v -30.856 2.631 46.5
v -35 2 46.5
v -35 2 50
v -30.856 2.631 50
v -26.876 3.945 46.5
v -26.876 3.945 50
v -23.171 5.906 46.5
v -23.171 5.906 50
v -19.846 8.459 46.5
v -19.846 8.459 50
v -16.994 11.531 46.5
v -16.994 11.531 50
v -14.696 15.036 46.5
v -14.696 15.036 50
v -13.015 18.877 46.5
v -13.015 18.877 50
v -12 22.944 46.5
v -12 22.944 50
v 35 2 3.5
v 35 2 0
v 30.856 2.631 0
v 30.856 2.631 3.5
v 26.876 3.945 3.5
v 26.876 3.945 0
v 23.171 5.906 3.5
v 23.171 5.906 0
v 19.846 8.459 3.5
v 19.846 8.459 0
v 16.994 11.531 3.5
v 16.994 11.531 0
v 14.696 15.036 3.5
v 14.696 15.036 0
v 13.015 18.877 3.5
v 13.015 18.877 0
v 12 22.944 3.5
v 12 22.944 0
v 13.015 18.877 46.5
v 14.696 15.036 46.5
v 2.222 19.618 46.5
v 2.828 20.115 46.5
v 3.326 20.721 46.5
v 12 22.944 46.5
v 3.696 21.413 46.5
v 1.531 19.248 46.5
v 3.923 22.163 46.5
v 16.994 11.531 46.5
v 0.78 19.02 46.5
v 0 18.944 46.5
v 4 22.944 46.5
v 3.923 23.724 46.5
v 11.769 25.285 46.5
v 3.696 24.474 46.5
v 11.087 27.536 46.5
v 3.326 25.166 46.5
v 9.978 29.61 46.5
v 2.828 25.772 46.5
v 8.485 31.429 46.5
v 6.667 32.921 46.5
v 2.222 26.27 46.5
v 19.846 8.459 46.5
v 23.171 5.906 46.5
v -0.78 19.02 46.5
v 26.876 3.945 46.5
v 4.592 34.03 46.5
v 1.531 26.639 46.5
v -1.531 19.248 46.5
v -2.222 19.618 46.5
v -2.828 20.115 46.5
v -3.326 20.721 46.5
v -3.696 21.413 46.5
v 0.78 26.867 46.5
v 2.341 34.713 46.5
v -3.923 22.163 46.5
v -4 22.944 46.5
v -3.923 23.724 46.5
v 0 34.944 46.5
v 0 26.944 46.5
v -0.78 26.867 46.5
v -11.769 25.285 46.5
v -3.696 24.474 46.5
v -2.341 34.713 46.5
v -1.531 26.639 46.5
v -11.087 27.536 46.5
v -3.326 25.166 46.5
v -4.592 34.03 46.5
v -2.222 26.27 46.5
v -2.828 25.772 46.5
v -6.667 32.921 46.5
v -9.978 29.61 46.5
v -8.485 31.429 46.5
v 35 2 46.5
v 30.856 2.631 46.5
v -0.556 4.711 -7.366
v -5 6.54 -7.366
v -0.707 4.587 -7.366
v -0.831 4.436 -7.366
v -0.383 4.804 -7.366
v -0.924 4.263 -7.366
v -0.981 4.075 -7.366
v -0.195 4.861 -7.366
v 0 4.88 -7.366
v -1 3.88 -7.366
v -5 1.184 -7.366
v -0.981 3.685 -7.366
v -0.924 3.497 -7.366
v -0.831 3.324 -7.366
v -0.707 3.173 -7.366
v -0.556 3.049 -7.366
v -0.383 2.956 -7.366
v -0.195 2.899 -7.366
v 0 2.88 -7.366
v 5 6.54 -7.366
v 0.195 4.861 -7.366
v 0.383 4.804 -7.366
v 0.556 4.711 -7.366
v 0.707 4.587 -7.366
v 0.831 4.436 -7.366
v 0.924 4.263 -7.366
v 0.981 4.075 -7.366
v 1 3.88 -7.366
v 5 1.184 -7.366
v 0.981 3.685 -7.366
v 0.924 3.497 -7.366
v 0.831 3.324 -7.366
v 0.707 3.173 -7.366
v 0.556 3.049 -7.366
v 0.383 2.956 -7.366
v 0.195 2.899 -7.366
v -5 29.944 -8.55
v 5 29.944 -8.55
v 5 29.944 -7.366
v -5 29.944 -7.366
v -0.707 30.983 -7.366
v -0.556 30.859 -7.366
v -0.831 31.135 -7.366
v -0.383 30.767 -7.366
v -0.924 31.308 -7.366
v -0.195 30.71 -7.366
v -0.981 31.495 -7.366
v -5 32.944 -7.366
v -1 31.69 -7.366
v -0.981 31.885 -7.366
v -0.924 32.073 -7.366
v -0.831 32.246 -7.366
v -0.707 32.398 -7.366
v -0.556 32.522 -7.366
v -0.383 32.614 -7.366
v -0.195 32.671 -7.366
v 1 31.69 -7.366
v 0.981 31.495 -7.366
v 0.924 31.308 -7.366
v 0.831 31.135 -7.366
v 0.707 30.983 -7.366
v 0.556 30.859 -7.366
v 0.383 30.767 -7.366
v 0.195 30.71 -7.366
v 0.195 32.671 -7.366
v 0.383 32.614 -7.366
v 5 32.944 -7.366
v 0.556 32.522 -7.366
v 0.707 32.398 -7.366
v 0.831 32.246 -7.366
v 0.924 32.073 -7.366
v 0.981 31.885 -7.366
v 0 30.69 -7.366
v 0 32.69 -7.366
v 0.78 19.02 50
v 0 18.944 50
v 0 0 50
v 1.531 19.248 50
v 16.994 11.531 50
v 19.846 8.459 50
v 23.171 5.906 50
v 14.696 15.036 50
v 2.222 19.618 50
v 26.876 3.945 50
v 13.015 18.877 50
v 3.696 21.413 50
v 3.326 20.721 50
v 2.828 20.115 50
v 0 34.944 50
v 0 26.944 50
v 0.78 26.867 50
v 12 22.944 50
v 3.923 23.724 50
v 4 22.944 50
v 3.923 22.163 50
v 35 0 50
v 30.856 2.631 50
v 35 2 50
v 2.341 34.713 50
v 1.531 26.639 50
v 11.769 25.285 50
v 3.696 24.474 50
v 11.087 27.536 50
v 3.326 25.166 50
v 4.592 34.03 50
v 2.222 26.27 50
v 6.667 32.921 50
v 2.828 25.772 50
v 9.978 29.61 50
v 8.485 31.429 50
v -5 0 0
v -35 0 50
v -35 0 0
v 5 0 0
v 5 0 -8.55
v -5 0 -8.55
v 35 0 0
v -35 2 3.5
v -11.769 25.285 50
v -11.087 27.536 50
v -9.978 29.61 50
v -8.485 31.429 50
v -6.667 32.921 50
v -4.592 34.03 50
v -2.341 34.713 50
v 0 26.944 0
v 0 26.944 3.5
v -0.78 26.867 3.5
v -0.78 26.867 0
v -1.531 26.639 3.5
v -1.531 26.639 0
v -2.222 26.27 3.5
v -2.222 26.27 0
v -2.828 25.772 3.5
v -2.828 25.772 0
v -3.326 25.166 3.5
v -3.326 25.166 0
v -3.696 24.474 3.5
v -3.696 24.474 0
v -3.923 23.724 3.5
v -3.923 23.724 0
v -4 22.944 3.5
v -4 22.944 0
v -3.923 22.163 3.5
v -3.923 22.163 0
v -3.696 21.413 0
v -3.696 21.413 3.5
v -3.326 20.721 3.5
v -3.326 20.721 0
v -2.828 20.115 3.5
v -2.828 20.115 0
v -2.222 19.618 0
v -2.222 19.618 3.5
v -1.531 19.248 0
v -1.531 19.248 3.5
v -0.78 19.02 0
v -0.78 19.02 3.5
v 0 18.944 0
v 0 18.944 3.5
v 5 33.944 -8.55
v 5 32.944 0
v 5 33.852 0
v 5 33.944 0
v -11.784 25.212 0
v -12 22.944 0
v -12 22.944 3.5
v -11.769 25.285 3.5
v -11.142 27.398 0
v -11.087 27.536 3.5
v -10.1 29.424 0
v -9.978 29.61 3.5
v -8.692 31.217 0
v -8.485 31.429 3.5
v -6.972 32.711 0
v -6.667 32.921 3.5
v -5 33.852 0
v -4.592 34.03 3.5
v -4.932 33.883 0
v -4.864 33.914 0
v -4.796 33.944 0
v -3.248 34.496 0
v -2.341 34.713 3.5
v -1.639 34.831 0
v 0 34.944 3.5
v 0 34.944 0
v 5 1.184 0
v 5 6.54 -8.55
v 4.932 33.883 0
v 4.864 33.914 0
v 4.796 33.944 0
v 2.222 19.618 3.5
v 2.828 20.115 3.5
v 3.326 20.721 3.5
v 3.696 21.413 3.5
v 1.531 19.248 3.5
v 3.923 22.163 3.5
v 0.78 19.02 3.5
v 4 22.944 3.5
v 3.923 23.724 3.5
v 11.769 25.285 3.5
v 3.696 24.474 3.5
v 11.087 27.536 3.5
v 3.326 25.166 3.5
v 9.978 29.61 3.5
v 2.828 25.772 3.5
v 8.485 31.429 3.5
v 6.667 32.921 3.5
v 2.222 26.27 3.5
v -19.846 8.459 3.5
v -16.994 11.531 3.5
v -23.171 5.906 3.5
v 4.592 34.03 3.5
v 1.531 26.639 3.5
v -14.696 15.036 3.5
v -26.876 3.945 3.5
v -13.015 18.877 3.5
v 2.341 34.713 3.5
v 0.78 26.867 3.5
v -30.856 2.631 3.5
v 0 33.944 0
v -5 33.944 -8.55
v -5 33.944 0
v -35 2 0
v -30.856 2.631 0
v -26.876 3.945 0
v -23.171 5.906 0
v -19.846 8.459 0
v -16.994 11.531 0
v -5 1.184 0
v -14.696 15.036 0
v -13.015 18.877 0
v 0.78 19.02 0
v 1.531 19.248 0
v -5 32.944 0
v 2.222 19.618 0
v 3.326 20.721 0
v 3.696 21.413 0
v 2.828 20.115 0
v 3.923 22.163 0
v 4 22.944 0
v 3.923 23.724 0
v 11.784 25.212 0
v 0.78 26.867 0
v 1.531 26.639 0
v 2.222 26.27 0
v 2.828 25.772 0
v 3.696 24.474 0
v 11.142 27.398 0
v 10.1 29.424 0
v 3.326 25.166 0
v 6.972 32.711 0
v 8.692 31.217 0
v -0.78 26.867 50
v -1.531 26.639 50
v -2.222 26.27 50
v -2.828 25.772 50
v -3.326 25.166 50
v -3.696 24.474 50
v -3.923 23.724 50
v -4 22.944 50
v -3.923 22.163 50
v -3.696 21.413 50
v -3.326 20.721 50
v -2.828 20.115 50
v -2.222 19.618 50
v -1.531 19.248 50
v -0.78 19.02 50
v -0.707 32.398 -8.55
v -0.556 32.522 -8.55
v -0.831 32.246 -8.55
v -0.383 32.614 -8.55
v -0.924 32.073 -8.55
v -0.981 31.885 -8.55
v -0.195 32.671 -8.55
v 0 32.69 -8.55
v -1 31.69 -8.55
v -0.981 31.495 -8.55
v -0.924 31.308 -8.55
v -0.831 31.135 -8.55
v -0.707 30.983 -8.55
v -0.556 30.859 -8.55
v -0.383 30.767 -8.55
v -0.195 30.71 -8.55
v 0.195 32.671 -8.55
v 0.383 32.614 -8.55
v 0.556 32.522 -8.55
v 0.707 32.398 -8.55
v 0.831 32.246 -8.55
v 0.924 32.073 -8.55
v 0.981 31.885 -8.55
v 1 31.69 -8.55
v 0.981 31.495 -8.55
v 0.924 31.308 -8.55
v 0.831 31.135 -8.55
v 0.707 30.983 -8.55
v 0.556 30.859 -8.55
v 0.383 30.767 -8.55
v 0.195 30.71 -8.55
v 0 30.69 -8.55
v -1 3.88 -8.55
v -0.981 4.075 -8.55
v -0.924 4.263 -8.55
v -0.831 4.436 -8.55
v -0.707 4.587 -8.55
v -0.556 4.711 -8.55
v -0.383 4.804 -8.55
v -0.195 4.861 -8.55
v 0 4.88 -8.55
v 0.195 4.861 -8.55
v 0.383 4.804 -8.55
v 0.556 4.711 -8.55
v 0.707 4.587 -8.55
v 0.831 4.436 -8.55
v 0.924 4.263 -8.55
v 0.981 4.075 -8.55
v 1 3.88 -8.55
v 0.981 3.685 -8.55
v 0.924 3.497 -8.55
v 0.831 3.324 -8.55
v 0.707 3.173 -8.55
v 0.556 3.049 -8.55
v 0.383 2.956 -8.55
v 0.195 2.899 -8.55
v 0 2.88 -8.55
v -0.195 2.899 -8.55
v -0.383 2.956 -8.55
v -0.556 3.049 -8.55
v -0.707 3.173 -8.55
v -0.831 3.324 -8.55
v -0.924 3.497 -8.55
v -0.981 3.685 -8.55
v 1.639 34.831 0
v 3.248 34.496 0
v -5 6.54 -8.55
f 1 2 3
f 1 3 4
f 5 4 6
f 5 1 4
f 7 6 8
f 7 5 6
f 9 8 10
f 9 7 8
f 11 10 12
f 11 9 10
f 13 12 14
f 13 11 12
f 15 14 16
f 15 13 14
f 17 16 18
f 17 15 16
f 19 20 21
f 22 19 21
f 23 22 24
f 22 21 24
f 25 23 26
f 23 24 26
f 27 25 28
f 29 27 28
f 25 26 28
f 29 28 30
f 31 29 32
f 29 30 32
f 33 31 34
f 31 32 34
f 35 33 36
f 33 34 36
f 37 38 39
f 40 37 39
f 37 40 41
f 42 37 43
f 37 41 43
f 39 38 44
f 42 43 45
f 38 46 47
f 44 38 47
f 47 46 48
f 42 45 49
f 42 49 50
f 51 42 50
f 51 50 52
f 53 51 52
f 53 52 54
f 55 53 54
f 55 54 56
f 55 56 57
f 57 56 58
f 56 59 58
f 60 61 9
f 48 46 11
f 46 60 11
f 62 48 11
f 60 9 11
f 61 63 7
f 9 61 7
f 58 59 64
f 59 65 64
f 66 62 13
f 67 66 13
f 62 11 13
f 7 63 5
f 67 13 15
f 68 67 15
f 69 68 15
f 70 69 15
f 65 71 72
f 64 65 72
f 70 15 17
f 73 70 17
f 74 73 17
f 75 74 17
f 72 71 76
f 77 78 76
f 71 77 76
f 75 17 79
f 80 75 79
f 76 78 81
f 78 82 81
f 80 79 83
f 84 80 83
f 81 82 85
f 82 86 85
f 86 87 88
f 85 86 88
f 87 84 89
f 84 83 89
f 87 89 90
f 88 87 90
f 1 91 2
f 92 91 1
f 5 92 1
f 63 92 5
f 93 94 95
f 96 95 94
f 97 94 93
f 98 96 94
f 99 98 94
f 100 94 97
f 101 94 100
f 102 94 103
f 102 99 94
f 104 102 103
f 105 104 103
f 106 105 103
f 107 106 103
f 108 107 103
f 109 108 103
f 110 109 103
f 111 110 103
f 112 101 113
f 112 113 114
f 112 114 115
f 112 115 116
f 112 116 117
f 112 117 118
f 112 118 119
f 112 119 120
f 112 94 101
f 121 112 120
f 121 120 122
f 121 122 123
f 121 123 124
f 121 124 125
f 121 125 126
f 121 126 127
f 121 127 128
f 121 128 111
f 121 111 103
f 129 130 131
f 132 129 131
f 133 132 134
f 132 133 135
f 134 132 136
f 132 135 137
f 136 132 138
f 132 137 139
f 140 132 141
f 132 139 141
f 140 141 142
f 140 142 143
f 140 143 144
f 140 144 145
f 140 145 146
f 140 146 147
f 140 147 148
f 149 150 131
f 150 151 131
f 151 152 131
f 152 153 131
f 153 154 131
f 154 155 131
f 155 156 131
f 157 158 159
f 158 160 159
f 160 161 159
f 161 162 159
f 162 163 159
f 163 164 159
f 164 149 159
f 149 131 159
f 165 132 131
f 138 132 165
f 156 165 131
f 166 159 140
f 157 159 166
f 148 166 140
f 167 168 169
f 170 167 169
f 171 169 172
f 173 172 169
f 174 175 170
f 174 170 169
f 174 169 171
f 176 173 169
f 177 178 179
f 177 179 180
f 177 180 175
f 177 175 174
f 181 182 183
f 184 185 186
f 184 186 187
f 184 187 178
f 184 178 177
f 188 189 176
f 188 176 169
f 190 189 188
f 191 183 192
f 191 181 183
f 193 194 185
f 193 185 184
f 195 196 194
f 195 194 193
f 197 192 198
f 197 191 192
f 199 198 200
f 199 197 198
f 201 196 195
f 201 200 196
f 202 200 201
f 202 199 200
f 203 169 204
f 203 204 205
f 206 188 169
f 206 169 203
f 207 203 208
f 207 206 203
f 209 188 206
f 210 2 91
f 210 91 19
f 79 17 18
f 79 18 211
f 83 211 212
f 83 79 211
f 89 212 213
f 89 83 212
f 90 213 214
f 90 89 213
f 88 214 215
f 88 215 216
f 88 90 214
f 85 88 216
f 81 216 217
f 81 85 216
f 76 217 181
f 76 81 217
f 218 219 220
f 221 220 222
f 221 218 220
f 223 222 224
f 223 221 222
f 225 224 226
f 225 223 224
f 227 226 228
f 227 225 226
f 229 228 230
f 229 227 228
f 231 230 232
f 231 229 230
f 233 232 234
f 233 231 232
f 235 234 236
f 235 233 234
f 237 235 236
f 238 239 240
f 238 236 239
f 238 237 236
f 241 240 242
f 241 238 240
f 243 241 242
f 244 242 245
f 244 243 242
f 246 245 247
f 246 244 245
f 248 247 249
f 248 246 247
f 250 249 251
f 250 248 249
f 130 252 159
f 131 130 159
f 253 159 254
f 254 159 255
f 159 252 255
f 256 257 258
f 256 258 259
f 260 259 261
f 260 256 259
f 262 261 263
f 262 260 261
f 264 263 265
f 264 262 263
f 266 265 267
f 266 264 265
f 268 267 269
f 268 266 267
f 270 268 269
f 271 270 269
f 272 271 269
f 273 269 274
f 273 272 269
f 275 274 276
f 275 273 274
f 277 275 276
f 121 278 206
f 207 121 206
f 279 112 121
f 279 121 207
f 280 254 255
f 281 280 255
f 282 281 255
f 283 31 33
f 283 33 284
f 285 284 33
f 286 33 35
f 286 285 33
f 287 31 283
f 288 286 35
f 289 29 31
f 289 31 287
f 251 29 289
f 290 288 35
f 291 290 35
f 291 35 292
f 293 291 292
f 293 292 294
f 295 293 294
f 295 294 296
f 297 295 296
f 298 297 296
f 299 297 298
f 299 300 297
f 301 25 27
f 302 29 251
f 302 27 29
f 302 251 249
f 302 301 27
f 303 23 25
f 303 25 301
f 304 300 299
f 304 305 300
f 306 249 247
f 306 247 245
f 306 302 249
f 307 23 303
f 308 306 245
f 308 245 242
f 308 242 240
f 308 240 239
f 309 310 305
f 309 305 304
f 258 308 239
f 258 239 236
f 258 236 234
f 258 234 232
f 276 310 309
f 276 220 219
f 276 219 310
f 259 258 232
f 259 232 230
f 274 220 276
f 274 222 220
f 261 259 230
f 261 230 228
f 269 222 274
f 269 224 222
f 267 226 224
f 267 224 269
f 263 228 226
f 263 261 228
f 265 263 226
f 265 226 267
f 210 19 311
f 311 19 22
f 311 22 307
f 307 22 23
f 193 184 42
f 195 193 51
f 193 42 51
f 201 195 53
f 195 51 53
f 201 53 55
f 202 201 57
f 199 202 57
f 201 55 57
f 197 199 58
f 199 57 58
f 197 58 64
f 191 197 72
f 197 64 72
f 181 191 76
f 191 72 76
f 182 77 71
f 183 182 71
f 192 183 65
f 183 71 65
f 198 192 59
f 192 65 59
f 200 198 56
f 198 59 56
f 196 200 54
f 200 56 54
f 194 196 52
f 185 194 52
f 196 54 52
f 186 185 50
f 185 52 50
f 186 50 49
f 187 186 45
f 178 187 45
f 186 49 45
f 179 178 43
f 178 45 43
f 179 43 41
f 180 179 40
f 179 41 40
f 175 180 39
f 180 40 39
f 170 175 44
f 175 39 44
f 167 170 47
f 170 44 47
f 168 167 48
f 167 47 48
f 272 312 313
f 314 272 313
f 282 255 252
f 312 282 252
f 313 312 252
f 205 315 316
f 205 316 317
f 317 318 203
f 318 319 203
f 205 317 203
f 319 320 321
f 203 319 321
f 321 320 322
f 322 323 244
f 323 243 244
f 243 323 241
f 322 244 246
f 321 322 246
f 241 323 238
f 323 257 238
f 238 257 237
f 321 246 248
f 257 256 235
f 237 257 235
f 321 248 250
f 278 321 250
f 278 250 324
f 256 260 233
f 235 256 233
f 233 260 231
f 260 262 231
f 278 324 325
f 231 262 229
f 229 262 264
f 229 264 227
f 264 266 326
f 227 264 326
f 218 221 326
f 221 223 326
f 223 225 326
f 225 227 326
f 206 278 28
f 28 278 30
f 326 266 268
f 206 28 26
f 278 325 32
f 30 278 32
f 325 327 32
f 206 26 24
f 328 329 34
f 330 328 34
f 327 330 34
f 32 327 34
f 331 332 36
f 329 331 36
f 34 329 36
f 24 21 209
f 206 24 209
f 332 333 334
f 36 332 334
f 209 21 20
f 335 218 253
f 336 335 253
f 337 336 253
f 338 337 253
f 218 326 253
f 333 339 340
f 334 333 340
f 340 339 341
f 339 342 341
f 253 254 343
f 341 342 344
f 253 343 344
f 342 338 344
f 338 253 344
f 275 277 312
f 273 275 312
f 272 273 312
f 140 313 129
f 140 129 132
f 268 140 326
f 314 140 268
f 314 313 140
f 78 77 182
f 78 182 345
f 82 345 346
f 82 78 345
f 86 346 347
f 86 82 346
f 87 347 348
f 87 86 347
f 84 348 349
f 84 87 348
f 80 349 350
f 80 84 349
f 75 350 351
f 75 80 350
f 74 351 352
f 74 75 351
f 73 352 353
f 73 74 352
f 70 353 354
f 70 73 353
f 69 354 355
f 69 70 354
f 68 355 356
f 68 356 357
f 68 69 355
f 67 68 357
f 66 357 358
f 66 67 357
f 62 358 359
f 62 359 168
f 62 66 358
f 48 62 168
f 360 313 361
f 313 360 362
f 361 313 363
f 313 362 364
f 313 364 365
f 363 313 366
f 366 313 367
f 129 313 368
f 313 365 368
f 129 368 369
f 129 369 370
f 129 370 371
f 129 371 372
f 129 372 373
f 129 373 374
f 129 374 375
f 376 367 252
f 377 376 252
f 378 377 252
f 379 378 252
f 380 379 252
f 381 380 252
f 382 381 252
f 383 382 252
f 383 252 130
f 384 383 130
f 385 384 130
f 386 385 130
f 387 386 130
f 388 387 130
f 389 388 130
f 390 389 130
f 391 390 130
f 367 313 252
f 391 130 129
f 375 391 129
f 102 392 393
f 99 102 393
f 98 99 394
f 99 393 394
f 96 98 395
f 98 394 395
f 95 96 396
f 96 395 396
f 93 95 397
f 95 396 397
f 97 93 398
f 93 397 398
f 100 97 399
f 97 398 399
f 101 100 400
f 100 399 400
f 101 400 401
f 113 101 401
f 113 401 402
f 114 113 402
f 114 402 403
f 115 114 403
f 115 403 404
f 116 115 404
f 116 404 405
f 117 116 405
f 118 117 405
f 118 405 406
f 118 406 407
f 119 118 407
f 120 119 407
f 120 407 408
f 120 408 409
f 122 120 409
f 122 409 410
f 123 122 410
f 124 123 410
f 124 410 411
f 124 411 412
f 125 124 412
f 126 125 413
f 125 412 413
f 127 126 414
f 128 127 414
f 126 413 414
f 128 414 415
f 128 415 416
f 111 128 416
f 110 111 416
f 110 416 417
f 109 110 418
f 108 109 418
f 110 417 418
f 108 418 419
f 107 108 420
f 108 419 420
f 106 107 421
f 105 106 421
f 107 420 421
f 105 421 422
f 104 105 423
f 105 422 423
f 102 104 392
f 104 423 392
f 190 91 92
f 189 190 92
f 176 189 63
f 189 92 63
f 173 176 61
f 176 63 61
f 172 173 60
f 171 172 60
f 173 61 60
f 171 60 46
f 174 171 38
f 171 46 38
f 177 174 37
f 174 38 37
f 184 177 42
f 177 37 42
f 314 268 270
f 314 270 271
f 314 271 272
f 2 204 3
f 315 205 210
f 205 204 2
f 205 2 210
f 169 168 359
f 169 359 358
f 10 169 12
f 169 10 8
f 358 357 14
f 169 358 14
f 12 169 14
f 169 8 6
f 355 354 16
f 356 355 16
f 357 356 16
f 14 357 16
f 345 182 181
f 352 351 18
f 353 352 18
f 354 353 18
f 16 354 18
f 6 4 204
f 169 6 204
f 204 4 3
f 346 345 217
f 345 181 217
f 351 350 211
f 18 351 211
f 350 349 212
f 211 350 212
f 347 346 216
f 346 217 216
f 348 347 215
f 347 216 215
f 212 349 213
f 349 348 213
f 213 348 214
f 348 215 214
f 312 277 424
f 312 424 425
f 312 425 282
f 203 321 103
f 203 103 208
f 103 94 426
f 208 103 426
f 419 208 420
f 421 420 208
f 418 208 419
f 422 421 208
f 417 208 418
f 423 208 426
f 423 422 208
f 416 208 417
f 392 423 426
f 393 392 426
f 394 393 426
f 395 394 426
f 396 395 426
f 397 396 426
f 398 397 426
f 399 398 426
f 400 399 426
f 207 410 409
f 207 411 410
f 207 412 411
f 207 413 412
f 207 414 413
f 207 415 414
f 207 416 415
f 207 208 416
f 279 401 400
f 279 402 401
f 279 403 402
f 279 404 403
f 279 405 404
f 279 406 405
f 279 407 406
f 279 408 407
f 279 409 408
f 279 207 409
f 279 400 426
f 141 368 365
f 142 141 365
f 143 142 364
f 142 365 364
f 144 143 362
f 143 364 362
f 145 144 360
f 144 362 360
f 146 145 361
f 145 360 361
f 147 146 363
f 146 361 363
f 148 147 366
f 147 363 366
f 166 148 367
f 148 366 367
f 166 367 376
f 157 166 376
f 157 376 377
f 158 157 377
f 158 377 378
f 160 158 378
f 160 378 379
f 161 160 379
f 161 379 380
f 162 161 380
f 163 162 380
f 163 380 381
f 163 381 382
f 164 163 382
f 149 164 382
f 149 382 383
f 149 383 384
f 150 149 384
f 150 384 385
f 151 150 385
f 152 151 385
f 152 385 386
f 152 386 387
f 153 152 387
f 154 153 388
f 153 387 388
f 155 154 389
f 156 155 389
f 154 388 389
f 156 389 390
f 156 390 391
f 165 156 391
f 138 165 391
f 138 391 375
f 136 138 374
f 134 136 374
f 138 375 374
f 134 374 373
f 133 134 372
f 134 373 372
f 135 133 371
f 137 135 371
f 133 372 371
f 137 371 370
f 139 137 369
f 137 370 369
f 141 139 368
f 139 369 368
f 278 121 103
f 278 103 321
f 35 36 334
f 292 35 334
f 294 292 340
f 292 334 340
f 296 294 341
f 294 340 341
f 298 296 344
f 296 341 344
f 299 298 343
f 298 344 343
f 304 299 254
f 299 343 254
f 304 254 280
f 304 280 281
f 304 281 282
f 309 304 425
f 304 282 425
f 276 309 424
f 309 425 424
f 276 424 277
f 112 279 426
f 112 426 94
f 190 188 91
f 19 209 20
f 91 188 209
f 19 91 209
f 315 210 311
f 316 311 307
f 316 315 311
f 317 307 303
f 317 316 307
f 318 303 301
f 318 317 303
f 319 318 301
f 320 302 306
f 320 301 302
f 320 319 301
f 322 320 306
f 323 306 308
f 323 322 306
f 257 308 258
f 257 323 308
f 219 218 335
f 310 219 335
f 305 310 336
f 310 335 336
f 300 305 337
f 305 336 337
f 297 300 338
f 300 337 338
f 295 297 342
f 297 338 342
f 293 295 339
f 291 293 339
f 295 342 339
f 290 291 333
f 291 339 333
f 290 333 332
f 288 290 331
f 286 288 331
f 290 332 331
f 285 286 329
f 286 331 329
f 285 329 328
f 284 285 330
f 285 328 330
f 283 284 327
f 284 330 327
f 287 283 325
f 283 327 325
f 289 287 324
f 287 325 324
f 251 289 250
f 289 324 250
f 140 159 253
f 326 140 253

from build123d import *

# Parameters (mm, degrees)
BOSS_EXTRUDE1_DEPTH      = 50
CUT_EXTRUDE1_DEPTH       = 71.328210001
CUT_EXTRUDE1_DEPTH_BACK  = 71.328210001
SKETCH3_W                = 43
SKETCH3_H                = 41.467755669
BOSS_EXTRUDE3_DEPTH      = 5
BOSS_EXTRUDE3_DEPTH_BACK = 5
CUT_EXTRUDE2_REACH       = 78.643
SKETCH6_R                = 1


with BuildPart() as part:
    # Sketch1 → Boss-Extrude1 (new body)
    with BuildSketch(Plane.XY):
        with BuildLine():
            Line((0, 34.943627773), (0, 26.943627773))
            ThreePointArc((0, 26.943627773), (-4, 22.943627773), (0, 18.943627773))
            Line((0, 18.943627773), (0, 0))
            Line((0, 0), (-35, 0))
            Line((-35, 0), (-35, 2))
            ThreePointArc((-35, 2), (-19.845914105, 8.458947707), (-12, 22.943627773))
            ThreePointArc((-12, 22.943627773), (-8.485281374, 31.428909148), (0, 34.943627773))
        make_face()
    boss_extrude1 = extrude(amount=BOSS_EXTRUDE1_DEPTH)

    # Mirror1: Boss-Extrude1 across plane
    add(boss_extrude1.mirror(Plane(origin=(0, 18.943627773, 50), x_dir=(0, 0, 1), z_dir=(-1, 0, 0))))

    # Sketch3 → Cut-Extrude1 (cut, two sides: drawn at the far end of the back side and taken through both)
    with BuildSketch(Plane(origin=(0, 0, 0), x_dir=(0, 0, -1), z_dir=(1, 0, 0)).offset(-CUT_EXTRUDE1_DEPTH_BACK)):
        with Locations((-25, 22.733877835)):
            Rectangle(SKETCH3_W, SKETCH3_H)
    extrude(amount=CUT_EXTRUDE1_DEPTH + CUT_EXTRUDE1_DEPTH_BACK, mode=Mode.SUBTRACT)

    # Sketch5 → Boss-Extrude3 (add, two sides: drawn at the far end of the back side and taken through both)
    with BuildSketch(Plane.ZY.offset(-BOSS_EXTRUDE3_DEPTH_BACK)):
        Polygon((-7.365906047, 6.54), (-7.365906047, 1.184093953), (0, 1.184093953), (0, 0), (-8.55, 0), (-8.55, 6.54), align=None)
        Polygon((0, 32.943627773), (0, 33.943627773), (-8.55, 33.943627773), (-8.55, 29.943627773), (-7.365906047, 29.943627773), (-7.365906047, 32.943627773), align=None)
    extrude(amount=BOSS_EXTRUDE3_DEPTH + BOSS_EXTRUDE3_DEPTH_BACK)

    # Sketch6 → Cut-Extrude2 (cut, up to next)
    with BuildSketch(Plane(origin=(0, 0, -8.55), x_dir=(-1, 0, 0), z_dir=(0, 0, -1)), mode=Mode.PRIVATE) as cut_extrude2_sk1:
        with Locations((0, 3.88)):
            Circle(SKETCH6_R)
    cut_extrude2_tool1 = extrude(cut_extrude2_sk1.sketch, amount=-CUT_EXTRUDE2_REACH, mode=Mode.PRIVATE) & part.part
    # Sketch6 → Cut-Extrude2 (cut, up to next)
    with BuildSketch(Plane(origin=(0, 0, -8.55), x_dir=(-1, 0, 0), z_dir=(0, 0, -1)), mode=Mode.PRIVATE) as cut_extrude2_sk2:
        with Locations((0, 31.690394603)):
            Circle(SKETCH6_R)
    cut_extrude2_tool2 = extrude(cut_extrude2_sk2.sketch, amount=-CUT_EXTRUDE2_REACH, mode=Mode.PRIVATE) & part.part
    add(cut_extrude2_tool1.solids().sort_by_distance((0, 3.88, -8.55))[0], mode=Mode.SUBTRACT)
    add(cut_extrude2_tool2.solids().sort_by_distance((0, 31.690395, -8.55))[0], mode=Mode.SUBTRACT)


solid = part.part
